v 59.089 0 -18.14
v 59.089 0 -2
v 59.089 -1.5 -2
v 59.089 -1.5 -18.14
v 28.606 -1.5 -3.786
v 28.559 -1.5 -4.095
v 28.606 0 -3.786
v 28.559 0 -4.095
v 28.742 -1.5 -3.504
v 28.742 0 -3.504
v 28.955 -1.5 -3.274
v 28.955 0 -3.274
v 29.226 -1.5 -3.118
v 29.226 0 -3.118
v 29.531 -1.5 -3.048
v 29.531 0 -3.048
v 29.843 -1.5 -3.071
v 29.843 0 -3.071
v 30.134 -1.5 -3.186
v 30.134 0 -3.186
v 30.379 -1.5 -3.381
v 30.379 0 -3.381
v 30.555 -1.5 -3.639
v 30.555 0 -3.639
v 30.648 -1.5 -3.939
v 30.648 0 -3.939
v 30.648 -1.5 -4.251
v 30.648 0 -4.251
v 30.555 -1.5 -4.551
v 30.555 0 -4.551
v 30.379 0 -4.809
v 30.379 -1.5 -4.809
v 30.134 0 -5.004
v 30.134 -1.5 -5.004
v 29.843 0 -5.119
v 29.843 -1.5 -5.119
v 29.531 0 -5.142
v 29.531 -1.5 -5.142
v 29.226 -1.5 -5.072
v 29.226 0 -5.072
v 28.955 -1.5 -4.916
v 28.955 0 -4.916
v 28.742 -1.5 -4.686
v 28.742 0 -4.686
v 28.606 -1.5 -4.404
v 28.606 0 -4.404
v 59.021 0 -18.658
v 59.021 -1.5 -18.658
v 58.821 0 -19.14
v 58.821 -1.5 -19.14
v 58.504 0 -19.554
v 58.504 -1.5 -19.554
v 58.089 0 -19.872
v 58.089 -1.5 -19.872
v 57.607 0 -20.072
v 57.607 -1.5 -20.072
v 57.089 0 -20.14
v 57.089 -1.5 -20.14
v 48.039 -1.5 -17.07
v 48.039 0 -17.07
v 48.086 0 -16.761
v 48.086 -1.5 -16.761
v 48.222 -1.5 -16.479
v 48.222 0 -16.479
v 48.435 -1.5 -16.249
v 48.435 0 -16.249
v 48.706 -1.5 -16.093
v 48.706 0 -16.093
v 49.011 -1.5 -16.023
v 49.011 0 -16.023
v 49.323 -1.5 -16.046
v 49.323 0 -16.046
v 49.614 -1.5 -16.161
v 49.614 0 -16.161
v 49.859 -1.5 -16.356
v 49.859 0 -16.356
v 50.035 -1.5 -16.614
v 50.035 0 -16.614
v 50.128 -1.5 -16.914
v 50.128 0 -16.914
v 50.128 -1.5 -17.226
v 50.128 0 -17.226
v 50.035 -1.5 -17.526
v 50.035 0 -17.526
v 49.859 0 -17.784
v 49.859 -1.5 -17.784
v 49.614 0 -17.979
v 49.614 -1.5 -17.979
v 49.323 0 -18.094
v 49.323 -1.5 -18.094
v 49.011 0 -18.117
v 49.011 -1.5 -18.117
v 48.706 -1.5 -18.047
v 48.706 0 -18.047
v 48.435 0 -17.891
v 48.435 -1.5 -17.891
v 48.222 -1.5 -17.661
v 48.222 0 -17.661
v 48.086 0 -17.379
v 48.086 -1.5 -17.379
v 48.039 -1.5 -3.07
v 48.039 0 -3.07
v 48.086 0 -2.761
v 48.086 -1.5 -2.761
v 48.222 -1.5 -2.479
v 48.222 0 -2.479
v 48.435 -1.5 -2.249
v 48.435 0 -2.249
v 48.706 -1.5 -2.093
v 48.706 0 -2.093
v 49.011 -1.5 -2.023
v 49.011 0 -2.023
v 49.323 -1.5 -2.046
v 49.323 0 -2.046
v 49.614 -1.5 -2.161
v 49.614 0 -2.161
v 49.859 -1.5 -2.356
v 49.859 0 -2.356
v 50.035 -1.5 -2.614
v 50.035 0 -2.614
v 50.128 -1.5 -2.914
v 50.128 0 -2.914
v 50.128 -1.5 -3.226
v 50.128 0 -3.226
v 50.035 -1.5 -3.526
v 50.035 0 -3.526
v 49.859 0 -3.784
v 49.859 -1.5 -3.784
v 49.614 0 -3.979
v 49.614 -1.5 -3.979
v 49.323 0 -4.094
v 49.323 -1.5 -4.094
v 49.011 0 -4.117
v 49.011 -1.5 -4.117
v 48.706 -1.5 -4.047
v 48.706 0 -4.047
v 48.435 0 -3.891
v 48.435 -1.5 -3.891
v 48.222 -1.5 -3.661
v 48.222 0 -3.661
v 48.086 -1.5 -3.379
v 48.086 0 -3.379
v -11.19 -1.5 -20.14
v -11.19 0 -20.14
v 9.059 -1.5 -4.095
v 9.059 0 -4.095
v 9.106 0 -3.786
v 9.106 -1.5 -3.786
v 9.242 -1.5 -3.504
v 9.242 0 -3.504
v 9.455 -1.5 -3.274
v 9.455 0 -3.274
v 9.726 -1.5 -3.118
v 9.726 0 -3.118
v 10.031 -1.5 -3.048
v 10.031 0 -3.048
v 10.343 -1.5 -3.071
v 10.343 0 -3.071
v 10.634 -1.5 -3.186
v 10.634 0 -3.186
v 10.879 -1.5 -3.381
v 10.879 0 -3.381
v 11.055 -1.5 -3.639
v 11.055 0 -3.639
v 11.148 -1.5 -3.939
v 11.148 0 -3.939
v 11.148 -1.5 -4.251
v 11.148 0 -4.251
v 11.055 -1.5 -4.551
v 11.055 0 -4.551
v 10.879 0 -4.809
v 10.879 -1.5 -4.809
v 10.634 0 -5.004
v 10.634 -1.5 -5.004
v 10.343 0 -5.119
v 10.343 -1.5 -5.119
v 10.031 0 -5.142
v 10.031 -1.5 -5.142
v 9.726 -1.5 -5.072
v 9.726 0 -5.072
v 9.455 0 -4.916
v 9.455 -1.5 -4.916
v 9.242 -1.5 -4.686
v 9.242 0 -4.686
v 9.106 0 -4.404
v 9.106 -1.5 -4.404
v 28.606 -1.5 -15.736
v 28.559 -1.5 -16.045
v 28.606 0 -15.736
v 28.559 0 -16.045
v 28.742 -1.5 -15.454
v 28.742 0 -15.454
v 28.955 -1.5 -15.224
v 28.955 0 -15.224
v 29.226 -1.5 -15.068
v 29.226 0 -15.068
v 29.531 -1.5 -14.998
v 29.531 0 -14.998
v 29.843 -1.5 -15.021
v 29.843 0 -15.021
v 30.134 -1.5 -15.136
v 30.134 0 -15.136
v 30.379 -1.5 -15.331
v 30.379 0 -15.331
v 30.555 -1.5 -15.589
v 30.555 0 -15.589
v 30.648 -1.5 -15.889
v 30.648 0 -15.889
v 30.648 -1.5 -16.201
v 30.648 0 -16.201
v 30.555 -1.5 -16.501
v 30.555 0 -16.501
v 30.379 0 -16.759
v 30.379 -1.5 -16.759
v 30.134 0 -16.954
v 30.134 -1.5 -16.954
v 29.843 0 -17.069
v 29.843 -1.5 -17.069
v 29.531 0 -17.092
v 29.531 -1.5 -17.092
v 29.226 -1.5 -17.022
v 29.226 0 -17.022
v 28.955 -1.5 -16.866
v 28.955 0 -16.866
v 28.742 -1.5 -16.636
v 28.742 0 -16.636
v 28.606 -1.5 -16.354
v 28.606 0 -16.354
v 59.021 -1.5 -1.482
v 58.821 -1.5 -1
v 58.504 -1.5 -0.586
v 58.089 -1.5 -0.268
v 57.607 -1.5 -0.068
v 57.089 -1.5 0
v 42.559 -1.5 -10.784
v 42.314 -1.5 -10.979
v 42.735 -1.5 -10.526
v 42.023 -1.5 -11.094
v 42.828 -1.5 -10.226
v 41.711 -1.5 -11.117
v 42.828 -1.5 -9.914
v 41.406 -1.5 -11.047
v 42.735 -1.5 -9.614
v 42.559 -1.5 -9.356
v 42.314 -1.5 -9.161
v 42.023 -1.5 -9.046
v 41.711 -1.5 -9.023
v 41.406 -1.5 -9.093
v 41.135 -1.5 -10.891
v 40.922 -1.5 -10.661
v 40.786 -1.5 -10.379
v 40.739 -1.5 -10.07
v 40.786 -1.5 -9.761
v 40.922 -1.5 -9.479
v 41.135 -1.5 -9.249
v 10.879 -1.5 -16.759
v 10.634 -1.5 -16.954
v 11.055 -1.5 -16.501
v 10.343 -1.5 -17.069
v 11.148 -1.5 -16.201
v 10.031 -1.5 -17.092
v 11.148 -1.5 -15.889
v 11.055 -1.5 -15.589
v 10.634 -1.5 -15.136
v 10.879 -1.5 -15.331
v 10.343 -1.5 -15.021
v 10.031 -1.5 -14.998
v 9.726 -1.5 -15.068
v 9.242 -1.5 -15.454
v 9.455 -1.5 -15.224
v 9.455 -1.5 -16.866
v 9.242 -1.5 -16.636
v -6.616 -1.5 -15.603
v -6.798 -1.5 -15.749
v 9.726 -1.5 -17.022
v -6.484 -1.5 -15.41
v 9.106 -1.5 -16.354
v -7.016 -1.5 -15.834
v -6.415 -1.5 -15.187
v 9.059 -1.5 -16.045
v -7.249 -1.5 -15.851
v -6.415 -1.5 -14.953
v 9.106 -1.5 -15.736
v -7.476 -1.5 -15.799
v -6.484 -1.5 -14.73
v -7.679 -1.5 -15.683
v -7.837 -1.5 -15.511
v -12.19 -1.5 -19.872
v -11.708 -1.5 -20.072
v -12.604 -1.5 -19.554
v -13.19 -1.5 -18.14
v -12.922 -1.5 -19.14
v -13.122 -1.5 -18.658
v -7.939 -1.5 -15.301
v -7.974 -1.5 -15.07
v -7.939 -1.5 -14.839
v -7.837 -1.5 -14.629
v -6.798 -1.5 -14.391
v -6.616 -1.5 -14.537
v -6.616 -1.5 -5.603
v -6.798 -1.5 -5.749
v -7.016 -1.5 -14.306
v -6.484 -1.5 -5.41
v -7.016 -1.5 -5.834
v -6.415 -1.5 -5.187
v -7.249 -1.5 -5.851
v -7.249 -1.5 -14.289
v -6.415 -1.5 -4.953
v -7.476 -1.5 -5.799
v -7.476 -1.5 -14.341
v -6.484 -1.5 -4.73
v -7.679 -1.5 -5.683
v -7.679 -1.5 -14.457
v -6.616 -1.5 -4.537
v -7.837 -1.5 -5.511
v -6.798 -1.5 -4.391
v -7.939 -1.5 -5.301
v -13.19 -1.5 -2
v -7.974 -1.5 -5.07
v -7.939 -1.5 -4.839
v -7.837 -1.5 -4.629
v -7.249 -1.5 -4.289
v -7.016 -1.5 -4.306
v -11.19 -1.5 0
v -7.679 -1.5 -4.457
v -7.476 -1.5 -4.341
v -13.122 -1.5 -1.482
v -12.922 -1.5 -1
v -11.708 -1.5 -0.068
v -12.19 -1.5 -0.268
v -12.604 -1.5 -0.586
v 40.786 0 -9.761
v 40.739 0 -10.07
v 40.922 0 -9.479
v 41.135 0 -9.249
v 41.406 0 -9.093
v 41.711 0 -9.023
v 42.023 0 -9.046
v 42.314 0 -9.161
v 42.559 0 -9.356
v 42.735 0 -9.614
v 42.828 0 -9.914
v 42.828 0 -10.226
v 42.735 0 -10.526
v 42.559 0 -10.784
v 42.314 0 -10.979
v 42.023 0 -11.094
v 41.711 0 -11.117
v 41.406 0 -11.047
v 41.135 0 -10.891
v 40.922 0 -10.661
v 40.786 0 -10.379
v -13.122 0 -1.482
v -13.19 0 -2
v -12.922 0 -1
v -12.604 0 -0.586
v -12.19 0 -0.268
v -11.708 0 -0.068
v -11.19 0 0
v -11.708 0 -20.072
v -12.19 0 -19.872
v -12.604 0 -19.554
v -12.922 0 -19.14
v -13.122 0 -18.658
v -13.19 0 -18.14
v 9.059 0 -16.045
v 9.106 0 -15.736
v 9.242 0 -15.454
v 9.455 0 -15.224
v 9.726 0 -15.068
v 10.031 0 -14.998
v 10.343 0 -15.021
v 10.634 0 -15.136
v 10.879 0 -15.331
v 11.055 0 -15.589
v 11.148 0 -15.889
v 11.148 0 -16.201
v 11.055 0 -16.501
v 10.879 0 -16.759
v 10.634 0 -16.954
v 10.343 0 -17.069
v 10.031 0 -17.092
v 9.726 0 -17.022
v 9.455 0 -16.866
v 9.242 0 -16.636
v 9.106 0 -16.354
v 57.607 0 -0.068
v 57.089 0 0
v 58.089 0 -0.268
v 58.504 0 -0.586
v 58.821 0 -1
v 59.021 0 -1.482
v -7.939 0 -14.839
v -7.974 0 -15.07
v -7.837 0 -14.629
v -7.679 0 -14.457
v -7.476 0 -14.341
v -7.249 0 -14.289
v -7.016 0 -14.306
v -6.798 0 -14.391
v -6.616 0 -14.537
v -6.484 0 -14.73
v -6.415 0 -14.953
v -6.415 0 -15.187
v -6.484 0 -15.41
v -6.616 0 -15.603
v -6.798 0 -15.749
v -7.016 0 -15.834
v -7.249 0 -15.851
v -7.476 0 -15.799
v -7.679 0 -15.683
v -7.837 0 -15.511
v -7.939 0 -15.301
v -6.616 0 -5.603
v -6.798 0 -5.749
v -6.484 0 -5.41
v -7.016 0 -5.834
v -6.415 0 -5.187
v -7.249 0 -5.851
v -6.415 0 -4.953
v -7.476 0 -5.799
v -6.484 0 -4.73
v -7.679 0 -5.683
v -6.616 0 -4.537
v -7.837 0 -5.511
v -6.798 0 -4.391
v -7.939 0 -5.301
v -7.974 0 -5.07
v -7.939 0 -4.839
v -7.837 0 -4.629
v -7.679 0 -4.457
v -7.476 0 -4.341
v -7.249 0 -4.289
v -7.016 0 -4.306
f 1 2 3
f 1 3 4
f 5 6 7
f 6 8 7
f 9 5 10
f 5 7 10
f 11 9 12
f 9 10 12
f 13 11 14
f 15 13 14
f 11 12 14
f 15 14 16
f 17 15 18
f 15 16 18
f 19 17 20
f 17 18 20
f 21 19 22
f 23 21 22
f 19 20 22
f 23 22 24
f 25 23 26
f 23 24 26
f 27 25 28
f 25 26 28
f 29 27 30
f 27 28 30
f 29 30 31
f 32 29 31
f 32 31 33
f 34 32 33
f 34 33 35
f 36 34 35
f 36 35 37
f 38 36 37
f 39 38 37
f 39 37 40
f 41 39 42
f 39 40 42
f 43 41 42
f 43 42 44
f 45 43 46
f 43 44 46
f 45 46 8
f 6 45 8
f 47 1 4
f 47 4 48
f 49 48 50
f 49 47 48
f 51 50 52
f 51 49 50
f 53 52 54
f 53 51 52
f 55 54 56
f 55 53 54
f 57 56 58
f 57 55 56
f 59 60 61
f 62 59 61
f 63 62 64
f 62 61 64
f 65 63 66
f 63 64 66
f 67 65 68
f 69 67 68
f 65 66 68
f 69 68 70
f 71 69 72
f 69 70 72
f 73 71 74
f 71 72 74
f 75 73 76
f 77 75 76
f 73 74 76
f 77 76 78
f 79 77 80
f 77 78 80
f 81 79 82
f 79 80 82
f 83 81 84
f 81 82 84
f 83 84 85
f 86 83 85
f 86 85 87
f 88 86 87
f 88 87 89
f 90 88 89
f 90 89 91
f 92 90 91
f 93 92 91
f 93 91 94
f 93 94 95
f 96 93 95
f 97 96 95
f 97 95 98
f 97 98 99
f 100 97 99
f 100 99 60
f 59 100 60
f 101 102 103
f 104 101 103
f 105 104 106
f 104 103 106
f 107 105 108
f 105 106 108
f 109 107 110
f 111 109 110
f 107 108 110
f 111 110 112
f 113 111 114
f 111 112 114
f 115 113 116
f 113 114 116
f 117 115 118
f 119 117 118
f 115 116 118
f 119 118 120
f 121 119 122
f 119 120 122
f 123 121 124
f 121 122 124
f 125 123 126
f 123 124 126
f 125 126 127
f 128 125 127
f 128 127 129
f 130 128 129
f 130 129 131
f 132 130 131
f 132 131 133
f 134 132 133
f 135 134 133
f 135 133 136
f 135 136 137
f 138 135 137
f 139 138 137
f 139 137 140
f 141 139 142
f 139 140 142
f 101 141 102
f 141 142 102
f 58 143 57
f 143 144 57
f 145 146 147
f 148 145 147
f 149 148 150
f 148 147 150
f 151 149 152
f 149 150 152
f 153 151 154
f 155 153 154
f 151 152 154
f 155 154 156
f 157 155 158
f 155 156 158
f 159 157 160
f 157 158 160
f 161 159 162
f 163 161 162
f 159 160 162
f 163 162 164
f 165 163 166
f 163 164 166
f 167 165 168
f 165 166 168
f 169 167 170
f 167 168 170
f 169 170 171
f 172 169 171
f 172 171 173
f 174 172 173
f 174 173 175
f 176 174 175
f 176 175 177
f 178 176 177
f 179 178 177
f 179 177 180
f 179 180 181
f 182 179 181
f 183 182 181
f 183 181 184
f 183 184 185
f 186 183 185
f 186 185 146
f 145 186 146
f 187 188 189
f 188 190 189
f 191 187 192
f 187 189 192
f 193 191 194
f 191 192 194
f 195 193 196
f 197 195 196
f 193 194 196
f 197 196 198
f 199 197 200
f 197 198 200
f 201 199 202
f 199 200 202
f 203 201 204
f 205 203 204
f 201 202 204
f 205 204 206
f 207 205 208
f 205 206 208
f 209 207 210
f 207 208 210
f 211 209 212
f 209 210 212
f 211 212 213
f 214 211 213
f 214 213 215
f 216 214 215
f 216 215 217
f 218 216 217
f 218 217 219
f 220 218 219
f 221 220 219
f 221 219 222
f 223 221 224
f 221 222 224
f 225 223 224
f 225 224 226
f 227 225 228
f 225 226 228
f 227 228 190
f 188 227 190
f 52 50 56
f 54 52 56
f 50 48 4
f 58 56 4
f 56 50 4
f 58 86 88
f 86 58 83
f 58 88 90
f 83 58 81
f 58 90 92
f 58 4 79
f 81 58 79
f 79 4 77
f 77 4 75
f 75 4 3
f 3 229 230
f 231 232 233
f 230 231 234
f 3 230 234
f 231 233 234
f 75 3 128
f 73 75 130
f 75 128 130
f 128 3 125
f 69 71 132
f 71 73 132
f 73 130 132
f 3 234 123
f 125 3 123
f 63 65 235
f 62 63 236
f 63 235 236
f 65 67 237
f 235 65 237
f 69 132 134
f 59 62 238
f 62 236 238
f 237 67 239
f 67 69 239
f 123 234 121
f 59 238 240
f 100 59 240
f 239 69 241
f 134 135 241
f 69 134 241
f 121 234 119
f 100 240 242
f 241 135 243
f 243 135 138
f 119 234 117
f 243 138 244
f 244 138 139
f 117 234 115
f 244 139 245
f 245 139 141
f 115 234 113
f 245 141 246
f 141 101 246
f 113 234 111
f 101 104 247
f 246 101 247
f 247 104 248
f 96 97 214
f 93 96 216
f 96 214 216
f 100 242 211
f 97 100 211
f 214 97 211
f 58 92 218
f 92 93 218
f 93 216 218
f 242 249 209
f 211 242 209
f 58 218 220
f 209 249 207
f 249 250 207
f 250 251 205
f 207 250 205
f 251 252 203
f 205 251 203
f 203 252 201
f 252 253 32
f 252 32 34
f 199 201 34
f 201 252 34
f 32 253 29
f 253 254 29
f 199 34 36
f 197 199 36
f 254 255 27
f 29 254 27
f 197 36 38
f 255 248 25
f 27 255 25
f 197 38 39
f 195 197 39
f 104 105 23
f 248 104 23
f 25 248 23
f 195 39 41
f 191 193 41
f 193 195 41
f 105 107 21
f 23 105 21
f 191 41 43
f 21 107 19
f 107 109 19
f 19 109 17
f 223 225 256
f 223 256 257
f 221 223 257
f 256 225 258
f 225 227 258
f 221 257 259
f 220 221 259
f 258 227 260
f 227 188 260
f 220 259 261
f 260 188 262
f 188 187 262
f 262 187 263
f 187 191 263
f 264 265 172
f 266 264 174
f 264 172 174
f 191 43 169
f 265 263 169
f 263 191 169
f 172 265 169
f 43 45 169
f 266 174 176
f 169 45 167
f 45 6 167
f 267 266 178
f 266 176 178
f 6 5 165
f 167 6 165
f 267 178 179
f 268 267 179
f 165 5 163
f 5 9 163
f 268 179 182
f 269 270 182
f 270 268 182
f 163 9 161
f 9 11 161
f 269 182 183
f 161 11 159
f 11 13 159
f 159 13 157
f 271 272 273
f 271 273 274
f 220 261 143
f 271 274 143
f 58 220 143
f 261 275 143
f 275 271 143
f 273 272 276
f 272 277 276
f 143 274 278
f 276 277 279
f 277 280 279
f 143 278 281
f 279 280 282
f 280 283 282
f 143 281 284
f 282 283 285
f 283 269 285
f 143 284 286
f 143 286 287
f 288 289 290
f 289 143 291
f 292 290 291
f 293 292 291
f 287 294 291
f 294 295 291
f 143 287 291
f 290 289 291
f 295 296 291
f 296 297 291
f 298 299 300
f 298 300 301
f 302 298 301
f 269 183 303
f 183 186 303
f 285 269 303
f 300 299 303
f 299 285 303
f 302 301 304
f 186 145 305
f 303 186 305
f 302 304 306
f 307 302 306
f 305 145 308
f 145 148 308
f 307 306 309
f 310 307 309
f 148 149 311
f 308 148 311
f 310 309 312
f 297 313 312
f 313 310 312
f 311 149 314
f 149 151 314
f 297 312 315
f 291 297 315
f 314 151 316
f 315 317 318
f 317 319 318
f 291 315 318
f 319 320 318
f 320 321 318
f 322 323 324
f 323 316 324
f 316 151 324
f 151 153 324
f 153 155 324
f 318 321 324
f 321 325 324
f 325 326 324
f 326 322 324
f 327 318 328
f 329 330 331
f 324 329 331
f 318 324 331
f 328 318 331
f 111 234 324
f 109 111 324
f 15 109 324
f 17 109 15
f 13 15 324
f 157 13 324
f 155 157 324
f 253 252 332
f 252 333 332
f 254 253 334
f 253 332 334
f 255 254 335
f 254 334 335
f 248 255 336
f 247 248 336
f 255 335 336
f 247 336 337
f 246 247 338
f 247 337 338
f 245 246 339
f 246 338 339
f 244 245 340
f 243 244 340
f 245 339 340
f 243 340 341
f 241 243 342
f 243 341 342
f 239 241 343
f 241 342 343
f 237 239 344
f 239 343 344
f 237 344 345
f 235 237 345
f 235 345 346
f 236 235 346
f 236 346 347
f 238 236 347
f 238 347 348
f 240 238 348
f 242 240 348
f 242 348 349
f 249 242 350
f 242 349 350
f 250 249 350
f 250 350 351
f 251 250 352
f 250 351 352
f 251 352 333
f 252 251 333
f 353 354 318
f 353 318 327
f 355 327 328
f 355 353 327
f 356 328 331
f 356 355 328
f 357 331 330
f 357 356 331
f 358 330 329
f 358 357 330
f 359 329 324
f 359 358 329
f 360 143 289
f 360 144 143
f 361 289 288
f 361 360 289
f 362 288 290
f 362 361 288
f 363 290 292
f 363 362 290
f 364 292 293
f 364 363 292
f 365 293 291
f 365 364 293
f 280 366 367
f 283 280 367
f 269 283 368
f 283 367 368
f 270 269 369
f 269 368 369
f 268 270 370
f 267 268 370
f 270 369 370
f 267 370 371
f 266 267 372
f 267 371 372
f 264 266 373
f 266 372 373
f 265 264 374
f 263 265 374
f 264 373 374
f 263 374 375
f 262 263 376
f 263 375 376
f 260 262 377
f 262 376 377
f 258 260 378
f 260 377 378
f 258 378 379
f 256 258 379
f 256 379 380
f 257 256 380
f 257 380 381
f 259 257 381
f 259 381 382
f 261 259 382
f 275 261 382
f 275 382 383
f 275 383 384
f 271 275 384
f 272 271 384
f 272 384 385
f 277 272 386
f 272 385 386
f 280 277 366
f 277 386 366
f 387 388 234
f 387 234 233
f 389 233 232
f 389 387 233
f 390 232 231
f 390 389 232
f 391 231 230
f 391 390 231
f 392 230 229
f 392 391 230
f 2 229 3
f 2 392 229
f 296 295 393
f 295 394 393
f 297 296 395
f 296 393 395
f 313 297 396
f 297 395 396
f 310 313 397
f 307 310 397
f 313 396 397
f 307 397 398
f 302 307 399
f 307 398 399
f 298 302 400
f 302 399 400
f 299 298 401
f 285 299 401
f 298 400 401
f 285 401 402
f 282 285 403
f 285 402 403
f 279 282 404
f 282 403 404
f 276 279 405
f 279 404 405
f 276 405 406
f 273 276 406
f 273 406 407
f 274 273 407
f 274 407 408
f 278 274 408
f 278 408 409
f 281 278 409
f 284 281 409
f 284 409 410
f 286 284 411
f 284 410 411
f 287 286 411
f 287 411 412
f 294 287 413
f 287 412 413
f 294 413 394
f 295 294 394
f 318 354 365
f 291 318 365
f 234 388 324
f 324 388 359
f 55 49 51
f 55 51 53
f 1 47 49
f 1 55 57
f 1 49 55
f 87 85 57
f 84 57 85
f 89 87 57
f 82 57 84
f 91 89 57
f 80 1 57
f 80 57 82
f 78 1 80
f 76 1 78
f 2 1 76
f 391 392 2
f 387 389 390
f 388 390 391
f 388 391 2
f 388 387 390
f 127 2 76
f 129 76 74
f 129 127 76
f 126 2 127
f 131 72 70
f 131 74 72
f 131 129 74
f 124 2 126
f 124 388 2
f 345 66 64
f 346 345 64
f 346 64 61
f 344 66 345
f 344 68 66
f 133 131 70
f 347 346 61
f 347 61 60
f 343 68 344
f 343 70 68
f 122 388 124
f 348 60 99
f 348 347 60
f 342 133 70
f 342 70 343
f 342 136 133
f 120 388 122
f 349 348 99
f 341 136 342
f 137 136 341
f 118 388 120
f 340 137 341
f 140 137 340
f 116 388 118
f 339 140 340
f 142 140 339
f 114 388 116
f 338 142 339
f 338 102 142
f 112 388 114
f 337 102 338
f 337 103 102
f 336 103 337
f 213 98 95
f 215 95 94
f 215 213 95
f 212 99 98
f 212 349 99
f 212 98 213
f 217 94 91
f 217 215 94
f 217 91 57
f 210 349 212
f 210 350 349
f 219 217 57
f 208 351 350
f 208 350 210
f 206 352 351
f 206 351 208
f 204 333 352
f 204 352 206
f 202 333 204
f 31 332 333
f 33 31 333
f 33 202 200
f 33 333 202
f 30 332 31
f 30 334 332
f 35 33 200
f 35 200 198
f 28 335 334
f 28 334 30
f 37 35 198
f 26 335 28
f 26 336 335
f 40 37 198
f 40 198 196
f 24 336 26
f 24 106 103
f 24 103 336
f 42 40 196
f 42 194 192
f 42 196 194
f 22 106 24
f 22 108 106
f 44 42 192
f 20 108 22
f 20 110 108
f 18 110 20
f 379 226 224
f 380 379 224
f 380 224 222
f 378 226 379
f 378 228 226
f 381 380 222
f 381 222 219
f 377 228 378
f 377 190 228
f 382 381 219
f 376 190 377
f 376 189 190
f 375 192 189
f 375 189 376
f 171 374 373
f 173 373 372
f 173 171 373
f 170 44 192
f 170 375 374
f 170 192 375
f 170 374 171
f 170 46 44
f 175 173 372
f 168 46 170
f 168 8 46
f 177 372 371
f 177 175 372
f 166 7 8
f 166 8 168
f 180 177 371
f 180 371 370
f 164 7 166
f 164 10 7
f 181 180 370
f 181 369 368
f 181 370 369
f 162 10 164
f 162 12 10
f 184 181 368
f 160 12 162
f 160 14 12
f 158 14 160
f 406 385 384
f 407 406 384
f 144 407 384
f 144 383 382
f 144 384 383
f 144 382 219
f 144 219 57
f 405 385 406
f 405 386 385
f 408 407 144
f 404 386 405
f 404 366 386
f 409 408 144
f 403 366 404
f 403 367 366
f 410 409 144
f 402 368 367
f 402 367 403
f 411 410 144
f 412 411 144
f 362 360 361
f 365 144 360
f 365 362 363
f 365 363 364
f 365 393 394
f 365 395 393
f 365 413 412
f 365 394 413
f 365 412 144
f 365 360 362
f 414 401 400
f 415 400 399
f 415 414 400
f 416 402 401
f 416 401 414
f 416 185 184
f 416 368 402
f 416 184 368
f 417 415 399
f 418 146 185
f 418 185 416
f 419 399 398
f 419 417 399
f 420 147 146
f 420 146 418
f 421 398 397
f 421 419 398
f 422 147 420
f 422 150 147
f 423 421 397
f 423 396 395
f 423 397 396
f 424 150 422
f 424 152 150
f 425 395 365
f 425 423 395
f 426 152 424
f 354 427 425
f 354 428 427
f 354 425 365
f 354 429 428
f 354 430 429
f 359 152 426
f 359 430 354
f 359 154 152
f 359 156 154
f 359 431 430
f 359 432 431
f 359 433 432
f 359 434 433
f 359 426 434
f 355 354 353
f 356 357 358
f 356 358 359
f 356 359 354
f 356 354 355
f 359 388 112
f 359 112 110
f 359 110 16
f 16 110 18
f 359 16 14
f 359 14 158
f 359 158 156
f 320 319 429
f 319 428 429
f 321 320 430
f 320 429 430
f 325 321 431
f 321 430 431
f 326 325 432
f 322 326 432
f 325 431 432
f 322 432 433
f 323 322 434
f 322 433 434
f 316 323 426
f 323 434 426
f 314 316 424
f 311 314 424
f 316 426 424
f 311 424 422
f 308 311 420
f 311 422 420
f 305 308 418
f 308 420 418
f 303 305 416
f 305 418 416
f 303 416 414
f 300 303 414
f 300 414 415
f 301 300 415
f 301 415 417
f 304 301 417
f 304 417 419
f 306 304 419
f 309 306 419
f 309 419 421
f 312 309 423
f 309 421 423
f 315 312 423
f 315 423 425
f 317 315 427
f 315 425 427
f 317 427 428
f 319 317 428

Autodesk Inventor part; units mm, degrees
ref_plane "YZ Plane" through (0, 0, 0) normal (1, 0, 0) x (0, 1, 0)
ref_plane "XZ Plane" through (0, 0, 0) normal (0, 1, 0) x (-1, 0, 0)
ref_plane "XY Plane" through (0, 0, 0) normal (0, 0, 1) x (1, 0, 0)
sketch "Sketch1" plane through (0, 0, 0) normal (0, 1, 0) x (-1, 0, 0)
  line L0 (-0.4496, -20.14) -> (-0.4496, 0)
  circle A0 centre (-29.6093, -16.045) radius 1.05
  circle A1 centre (-29.6093, -4.095) radius 1.05
  circle A2 centre (-10.1093, -4.095) radius 1.05
  circle A3 centre (-10.1093, -16.045) radius 1.05
  circle A4 centre (7.19, -5.07) radius 0.7835
  circle A5 centre (7.19, -15.07) radius 0.7835
  circle A6 centre (-41.7893, -10.07) radius 1.05
  circle A7 centre (-49.0893, -17.07) radius 1.05
  circle A8 centre (-49.0893, -3.07) radius 1.05
  arc A9 (-59.0893, -18.14) -> (-57.0893, -20.14) centre (-57.0893, -18.14) ccw
  line L1 (-59.0893, -2) -> (-59.0893, -18.14)
  arc A10 (-57.0893, 0) -> (-59.0893, -2) centre (-57.0893, -2) ccw
  arc A11 (11.19, -20.14) -> (13.19, -18.14) centre (11.19, -18.14) ccw
  line L2 (13.19, -2) -> (13.19, -18.14)
  arc A12 (13.19, -2) -> (11.19, 0) centre (11.19, -2) ccw
  line L3 (-57.0893, 0) -> (11.19, 0)
  line L4 (11.19, -20.14) -> (-57.0893, -20.14)
  line L5 (-0.8993, -20.14) -> (-0.8993, 0)
  line L6 (0, 0) -> (0, -20.14)
extrude "Plate1" add sketch "Sketch1" against normal blind 1.5
equation "\"d0\" = Thickness"
equation "\"BendReliefWidth\" = Thickness"
equation "\"BendReliefDepth\" = 0.5 * Thickness"
equation "\"CornerReliefSize\" = 4 * Thickness"
equation "\"MinimumRemnant\" = 2 * Thickness"
equation "\"TransitionRadius\" = BendRadius"
equation "\"JacobiRadiusSize\" = BendRadius"
equation "\"GapSize\" = Thickness"
equation "\"Thickness\" = 1.5"
equation "\"BendRadius\" = 0.31"
properties part number "CAM_servo_bracket_top" material "Aluminum 6061"
